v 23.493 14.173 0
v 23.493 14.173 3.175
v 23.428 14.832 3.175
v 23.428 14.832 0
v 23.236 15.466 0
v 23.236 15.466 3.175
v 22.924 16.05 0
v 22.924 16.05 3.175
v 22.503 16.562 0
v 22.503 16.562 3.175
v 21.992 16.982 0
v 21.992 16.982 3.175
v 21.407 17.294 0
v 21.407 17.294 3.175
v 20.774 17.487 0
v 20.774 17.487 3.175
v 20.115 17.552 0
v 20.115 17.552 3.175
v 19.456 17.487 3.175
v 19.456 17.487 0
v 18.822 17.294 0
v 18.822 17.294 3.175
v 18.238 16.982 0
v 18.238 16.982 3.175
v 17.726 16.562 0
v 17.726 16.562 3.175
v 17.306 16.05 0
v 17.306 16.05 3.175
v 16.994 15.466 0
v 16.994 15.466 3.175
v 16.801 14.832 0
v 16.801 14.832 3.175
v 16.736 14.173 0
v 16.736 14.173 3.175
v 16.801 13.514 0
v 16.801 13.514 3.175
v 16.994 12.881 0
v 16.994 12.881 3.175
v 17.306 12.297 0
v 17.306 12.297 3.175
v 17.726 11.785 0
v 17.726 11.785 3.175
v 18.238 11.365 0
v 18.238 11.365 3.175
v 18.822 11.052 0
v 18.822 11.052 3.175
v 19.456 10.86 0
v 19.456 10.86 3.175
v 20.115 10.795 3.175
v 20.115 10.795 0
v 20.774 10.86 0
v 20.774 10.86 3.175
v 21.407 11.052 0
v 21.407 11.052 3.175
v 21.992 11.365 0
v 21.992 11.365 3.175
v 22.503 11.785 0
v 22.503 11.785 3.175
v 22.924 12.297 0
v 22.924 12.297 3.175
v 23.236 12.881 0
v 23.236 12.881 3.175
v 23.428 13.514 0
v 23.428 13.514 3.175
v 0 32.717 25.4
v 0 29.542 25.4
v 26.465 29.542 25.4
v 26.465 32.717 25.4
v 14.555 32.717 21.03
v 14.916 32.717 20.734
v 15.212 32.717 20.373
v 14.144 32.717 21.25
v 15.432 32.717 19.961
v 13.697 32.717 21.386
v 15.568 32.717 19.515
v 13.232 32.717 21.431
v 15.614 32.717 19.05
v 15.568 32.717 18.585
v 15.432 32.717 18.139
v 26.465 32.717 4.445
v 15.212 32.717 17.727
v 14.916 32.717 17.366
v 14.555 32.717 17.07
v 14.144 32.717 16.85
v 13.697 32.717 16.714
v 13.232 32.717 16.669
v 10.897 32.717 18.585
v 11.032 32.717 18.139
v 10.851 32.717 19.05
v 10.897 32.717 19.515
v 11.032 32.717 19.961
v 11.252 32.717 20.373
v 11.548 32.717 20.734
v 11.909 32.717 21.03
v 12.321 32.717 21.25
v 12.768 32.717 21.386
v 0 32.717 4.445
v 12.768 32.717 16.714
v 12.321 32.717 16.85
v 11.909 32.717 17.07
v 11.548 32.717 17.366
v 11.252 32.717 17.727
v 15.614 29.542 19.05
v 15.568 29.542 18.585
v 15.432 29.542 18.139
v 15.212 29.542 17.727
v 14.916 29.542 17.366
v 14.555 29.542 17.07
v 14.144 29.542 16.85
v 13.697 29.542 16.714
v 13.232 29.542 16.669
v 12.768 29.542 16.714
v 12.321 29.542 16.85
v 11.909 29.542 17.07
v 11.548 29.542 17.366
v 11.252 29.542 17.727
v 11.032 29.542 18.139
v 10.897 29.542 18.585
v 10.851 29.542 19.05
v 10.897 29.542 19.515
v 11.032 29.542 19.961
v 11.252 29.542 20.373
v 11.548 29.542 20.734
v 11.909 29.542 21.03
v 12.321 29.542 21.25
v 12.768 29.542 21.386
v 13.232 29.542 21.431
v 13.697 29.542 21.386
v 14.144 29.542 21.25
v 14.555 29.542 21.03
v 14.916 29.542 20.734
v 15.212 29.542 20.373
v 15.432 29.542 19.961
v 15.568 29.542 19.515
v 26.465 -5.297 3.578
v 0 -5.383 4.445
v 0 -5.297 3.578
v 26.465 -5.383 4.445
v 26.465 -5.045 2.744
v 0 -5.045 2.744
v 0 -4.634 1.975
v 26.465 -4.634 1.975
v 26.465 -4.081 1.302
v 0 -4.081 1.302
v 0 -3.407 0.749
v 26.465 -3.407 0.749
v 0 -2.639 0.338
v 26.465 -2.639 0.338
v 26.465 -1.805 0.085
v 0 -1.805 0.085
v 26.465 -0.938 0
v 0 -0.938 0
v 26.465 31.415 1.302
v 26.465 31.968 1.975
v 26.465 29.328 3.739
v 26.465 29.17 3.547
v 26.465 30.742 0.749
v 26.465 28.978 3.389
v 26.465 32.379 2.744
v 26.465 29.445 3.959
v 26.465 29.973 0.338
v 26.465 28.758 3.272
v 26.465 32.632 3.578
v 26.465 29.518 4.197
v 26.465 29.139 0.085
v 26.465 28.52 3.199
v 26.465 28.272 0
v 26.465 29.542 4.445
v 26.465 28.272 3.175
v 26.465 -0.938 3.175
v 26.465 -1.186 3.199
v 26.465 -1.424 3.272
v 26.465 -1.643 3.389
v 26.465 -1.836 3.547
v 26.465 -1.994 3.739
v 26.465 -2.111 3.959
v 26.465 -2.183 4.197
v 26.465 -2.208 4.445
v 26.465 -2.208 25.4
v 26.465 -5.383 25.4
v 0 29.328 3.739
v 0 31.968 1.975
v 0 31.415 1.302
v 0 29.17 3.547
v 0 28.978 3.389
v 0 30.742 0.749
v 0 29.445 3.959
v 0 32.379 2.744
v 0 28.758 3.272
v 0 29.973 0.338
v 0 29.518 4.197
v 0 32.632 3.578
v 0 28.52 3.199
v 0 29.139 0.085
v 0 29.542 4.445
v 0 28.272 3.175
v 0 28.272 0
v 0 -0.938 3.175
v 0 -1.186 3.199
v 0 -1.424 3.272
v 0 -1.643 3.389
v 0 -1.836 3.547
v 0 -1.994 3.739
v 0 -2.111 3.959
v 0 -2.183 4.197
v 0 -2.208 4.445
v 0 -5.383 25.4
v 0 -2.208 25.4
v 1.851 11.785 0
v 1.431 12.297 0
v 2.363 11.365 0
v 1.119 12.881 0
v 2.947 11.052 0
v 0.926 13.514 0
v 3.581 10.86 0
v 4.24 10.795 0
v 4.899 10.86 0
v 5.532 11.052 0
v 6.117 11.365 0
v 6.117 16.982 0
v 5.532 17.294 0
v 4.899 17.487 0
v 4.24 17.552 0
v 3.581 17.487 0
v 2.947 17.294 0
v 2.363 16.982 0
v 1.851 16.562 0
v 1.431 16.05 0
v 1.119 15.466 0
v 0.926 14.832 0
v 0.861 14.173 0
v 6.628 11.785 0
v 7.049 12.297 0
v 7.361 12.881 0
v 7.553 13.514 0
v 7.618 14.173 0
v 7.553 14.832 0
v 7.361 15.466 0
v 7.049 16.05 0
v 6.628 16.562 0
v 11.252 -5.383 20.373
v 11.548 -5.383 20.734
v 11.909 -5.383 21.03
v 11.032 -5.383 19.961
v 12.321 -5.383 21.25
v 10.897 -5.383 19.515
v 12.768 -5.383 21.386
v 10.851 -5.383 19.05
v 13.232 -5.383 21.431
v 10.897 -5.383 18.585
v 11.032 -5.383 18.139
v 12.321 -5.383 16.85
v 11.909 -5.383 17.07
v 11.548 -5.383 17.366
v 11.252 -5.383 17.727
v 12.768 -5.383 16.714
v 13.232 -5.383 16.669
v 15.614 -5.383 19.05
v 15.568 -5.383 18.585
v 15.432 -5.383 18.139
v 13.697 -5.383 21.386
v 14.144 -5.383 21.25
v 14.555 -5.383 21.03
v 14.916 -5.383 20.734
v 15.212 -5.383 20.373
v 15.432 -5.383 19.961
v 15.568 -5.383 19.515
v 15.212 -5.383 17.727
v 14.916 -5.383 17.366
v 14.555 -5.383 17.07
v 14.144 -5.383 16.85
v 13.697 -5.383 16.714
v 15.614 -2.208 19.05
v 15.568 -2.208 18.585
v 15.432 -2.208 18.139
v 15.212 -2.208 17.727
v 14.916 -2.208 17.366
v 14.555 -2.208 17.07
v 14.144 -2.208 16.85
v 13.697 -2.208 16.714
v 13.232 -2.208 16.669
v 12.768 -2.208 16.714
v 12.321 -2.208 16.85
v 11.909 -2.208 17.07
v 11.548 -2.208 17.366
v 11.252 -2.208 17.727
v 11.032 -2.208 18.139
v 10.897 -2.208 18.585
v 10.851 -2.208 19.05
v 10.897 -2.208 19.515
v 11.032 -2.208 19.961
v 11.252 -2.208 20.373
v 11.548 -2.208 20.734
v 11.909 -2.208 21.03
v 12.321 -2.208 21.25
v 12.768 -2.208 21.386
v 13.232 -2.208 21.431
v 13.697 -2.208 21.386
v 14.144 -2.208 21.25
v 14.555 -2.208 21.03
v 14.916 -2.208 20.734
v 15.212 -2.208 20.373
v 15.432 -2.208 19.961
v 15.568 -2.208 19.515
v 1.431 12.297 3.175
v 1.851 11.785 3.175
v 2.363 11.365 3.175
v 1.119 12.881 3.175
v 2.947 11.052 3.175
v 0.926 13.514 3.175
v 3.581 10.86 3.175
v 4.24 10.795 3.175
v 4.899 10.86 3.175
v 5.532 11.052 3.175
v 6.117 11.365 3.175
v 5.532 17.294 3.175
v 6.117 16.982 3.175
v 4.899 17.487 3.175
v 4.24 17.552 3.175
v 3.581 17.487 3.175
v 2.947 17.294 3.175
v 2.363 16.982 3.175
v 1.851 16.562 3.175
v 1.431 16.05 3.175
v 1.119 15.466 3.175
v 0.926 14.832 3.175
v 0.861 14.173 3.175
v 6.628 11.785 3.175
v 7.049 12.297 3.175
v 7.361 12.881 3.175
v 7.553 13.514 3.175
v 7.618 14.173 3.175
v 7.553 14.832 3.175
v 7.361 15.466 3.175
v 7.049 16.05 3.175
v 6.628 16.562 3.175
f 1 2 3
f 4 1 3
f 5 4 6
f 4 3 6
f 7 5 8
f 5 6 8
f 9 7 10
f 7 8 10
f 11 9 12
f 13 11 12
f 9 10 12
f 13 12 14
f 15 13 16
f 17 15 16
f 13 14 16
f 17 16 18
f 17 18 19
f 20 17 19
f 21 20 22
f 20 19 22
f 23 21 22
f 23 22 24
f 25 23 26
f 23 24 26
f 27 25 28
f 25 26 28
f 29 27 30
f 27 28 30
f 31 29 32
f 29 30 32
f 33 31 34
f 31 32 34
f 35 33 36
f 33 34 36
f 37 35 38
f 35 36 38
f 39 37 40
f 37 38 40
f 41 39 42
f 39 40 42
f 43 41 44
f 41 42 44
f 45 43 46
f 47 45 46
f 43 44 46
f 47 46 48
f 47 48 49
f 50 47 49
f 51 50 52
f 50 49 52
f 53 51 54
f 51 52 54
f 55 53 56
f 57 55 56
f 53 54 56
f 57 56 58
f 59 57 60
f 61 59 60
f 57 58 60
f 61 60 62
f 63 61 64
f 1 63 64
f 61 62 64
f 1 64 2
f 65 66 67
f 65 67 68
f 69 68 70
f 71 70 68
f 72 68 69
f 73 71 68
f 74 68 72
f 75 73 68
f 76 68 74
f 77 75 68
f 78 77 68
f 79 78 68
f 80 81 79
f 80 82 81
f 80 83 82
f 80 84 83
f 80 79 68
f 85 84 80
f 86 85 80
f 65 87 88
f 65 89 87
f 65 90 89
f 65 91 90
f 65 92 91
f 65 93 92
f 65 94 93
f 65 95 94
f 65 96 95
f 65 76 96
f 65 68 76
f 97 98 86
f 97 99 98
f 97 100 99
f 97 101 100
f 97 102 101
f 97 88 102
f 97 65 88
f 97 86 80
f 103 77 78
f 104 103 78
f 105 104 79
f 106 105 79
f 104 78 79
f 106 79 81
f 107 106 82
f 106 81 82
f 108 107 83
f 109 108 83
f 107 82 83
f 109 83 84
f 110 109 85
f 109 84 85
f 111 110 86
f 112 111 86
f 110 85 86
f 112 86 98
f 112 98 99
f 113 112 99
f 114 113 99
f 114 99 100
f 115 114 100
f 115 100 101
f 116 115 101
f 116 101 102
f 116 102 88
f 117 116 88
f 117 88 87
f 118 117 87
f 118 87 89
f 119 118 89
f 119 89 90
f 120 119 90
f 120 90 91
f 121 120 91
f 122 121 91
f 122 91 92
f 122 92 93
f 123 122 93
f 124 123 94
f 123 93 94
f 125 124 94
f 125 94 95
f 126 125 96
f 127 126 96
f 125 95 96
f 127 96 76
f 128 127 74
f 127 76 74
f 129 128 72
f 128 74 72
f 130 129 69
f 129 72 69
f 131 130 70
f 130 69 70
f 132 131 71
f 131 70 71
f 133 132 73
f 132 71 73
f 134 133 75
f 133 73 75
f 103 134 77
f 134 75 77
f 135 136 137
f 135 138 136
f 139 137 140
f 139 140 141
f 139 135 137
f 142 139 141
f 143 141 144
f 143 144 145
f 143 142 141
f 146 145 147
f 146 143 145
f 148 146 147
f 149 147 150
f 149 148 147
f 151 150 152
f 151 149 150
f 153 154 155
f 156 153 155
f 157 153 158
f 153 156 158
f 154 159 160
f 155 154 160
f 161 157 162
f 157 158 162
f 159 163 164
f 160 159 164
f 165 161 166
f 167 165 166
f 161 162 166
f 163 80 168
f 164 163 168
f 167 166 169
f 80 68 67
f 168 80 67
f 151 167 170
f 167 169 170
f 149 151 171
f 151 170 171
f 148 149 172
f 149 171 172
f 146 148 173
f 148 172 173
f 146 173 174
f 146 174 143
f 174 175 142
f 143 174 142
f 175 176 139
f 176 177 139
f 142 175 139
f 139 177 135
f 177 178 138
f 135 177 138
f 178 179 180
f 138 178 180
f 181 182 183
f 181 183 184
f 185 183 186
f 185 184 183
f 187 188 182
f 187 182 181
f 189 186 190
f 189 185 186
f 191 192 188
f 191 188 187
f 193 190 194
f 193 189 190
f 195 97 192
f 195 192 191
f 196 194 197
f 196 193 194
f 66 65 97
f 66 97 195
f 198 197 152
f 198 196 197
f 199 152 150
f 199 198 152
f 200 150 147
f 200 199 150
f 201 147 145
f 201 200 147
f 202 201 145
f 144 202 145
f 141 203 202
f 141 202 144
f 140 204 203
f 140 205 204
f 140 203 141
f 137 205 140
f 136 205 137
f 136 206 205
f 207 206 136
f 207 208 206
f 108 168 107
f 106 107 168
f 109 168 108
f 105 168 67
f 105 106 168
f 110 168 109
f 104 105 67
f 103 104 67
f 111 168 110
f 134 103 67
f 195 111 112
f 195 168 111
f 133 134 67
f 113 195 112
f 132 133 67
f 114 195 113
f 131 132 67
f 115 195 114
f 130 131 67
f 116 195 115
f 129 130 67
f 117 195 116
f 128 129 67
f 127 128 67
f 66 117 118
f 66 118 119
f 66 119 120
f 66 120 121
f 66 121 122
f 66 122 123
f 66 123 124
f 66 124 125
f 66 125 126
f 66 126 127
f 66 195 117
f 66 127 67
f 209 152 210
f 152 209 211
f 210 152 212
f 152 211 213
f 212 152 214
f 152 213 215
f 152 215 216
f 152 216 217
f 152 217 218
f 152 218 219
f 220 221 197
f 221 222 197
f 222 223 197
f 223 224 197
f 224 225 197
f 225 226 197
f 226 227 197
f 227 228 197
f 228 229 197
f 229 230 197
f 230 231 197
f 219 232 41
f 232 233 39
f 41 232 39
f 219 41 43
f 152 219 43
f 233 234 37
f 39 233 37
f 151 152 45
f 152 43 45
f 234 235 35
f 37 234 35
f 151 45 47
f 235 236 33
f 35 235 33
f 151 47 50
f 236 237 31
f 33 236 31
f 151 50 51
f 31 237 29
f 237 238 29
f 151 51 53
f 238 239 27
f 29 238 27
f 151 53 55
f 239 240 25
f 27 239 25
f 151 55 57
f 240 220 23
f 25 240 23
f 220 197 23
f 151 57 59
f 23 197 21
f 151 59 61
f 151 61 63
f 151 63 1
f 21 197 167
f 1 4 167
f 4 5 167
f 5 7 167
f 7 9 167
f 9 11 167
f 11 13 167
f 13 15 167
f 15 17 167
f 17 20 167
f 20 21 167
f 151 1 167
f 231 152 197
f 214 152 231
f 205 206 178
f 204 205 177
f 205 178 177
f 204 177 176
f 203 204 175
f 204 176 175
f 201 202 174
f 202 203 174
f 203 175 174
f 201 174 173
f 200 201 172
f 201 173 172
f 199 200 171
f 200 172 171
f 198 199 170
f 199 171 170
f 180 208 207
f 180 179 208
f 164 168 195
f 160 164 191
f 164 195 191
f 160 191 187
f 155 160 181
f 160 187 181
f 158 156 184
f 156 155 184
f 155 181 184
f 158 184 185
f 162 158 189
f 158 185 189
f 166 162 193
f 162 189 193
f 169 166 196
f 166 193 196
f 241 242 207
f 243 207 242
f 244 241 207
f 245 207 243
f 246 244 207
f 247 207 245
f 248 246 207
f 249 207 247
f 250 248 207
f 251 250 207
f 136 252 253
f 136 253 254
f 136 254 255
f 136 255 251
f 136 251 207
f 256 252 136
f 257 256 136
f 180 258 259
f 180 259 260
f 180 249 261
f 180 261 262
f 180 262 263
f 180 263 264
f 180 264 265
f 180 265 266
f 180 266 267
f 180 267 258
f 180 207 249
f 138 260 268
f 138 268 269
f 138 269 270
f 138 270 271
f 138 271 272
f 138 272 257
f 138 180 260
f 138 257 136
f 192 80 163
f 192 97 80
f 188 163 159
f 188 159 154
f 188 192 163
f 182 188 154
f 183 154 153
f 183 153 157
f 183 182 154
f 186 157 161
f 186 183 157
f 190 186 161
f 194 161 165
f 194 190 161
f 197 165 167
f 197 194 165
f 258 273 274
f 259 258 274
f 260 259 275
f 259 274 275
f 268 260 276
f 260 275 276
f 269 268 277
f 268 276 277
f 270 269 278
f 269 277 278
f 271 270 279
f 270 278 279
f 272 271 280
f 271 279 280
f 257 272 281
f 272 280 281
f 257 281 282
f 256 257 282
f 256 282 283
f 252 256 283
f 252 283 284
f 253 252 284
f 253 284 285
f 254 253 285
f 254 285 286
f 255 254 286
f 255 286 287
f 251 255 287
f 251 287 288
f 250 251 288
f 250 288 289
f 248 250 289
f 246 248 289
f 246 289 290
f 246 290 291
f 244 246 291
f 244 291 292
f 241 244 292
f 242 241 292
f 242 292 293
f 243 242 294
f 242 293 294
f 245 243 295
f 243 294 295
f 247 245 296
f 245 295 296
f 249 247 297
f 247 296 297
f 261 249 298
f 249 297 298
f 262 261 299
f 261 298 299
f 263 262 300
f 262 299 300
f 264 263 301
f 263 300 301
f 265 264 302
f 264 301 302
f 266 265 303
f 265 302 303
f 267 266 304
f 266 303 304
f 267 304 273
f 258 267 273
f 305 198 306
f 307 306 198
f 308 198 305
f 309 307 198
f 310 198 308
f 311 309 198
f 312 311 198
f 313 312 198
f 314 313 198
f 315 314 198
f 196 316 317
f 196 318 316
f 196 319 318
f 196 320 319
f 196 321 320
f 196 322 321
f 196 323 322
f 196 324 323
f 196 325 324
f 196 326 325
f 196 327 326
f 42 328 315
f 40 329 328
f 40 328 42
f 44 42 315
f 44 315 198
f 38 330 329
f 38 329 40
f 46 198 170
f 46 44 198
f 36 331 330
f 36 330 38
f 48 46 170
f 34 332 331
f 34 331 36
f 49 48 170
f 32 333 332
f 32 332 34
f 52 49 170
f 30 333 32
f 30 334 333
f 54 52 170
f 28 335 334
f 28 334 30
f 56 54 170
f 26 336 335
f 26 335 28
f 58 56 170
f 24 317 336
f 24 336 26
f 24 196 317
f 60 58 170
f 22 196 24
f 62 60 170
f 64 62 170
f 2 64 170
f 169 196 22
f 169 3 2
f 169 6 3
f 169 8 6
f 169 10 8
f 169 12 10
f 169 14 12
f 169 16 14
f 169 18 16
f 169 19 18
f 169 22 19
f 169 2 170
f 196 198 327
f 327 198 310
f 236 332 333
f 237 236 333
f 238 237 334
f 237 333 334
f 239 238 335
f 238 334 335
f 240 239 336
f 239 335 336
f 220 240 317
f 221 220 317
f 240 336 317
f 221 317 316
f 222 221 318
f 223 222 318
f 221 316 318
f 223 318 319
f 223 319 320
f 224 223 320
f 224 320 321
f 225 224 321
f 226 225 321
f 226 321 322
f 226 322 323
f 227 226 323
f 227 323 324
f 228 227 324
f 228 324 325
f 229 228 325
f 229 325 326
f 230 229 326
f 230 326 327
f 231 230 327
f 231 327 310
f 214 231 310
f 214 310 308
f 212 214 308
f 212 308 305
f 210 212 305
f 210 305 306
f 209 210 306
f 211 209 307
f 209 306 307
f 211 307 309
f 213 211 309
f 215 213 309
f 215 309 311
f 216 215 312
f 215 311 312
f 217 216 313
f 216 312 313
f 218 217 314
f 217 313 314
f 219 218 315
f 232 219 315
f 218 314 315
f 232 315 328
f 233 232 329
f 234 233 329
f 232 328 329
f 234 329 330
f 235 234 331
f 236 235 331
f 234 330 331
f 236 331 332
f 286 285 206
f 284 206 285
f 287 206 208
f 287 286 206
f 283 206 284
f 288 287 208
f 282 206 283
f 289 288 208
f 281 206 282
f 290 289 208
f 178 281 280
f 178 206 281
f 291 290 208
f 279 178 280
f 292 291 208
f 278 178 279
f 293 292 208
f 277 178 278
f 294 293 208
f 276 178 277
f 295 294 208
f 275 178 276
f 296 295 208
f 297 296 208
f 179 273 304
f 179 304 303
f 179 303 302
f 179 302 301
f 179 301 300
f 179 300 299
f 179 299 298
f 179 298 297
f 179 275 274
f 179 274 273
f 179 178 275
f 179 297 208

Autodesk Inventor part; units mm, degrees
ref_plane "YZ Plane" through (0, 0, 0) normal (1, 0, 0) x (0, 1, 0)
ref_plane "XZ Plane" through (0, 0, 0) normal (0, 1, 0) x (-1, 0, 0)
ref_plane "XY Plane" through (0, 0, 0) normal (0, 0, 1) x (1, 0, 0)
sketch "Sketch1" plane through (0, 0, 0) normal (0, 0, 1) x (1, 0, 0)
  circle A0 centre (5.881, 13.6671) radius 3.1287
  circle A1 centre (20.5836, 13.6671) radius 3.1287
  line L0 (0, -0.9379) -> (26.4647, -0.9379)
  line L1 (26.4647, 28.2721) -> (26.4647, -0.9379)
  line L2 (0, 28.2721) -> (26.4647, 28.2721)
  line L3 (0, -0.9379) -> (0, 28.2721)
  point P0 (0, 0)
  dimension "d4" = 14.7026
  dimension "d5" = 29.21
  dimension "d21" = 14.605
extrude "Plate1" add sketch "Sketch1" along normal blind 3.175 contours A0 | A1 | L3 L2 L1 L0
sketch "Sketch2" plane through (0, 29.5421, 4.445) normal (0, 1, 0) x (-1, 0, 0)
  line L0 (-26.4647, 0) -> (0, 0)
  line L1 (0, 0) -> (0, 20.955)
  line L2 (0, 20.955) -> (-26.4647, 20.955)
  line L3 (-26.4647, 20.955) -> (-26.4647, 0)
edge flange "Flange1" height 25.4 angle 90 thickness 3.175 bend radius 1.27 thickness toward (0, 1, 0) relief straight relief width 3.175 relief depth 1.5875 corner gap 3.175 corner form 0 edges at (13.2323, 28.2721, 3.175) (13.2323, -0.9379, 3.175) wall of the first edge with corners at (26.4647, 29.5421, 4.445) (0, 29.5421, 4.445) (0, 29.5421, 25.4) (26.4647, 29.5421, 25.4)
bend "Bend1"
corner "Corner1"
sketch "Sketch3" plane through (0, 32.7171, 25.4) normal (0, 1, 0) x (1, 0, 0)
  line L0 (26.4647, 0) -> (0, 0) projected
  line L1 (26.4647, 20.955) -> (26.4647, 0) projected
  line L2 (13.2323, 0) -> (13.2323, 6.35)
  circle A0 centre (13.2323, 6.35) radius 2.3813
  point P0 (0, 25.4)
  dimension "d17" = 6.35
  dimension "d18" = 4.7625
extrude "Extrusion1" cut sketch "Sketch3" against normal blind 76174.6
sketch "Sketch5" plane through (0, 0, 3.175) normal (0, 0, 1) x (1, 0, 0)
  circle A0 centre (20.1147, 14.1734) radius 3.3782 projected
  circle A1 centre (4.2397, 14.1734) radius 3.3782 projected
  point P0 (0, 0)
extrude "Cut1" cut sketch "Sketch5" against normal blind 3.175
equation "\"d22\" = Thickness"
equation "\"d7\" = BendReliefWidth"
equation "\"d8\" = BendReliefDepth"
equation "\"d9\" = MinimumRemnant"
equation "\"d10\" = BendRadius"
equation "\"d14\" = CornerReliefSize"
equation "\"d15\" = GapSize"
equation "\"d16\" = JacobiRadiusSize"
equation "\"BendRadius\" = Thickness"
equation "\"BendReliefWidth\" = Thickness"
equation "\"BendReliefDepth\" = 0.5 * Thickness"
equation "\"CornerReliefSize\" = 4 * Thickness"
equation "\"MinimumRemnant\" = 2 * Thickness"
equation "\"TransitionRadius\" = BendRadius"
equation "\"JacobiRadiusSize\" = Thickness"
equation "\"GapSize\" = Thickness"
equation "\"d6\" = BendRadius"
equation "\"Thickness\" = 3.175"
properties part number "pulley mount. actual ipt" material "Aluminum 6061"
